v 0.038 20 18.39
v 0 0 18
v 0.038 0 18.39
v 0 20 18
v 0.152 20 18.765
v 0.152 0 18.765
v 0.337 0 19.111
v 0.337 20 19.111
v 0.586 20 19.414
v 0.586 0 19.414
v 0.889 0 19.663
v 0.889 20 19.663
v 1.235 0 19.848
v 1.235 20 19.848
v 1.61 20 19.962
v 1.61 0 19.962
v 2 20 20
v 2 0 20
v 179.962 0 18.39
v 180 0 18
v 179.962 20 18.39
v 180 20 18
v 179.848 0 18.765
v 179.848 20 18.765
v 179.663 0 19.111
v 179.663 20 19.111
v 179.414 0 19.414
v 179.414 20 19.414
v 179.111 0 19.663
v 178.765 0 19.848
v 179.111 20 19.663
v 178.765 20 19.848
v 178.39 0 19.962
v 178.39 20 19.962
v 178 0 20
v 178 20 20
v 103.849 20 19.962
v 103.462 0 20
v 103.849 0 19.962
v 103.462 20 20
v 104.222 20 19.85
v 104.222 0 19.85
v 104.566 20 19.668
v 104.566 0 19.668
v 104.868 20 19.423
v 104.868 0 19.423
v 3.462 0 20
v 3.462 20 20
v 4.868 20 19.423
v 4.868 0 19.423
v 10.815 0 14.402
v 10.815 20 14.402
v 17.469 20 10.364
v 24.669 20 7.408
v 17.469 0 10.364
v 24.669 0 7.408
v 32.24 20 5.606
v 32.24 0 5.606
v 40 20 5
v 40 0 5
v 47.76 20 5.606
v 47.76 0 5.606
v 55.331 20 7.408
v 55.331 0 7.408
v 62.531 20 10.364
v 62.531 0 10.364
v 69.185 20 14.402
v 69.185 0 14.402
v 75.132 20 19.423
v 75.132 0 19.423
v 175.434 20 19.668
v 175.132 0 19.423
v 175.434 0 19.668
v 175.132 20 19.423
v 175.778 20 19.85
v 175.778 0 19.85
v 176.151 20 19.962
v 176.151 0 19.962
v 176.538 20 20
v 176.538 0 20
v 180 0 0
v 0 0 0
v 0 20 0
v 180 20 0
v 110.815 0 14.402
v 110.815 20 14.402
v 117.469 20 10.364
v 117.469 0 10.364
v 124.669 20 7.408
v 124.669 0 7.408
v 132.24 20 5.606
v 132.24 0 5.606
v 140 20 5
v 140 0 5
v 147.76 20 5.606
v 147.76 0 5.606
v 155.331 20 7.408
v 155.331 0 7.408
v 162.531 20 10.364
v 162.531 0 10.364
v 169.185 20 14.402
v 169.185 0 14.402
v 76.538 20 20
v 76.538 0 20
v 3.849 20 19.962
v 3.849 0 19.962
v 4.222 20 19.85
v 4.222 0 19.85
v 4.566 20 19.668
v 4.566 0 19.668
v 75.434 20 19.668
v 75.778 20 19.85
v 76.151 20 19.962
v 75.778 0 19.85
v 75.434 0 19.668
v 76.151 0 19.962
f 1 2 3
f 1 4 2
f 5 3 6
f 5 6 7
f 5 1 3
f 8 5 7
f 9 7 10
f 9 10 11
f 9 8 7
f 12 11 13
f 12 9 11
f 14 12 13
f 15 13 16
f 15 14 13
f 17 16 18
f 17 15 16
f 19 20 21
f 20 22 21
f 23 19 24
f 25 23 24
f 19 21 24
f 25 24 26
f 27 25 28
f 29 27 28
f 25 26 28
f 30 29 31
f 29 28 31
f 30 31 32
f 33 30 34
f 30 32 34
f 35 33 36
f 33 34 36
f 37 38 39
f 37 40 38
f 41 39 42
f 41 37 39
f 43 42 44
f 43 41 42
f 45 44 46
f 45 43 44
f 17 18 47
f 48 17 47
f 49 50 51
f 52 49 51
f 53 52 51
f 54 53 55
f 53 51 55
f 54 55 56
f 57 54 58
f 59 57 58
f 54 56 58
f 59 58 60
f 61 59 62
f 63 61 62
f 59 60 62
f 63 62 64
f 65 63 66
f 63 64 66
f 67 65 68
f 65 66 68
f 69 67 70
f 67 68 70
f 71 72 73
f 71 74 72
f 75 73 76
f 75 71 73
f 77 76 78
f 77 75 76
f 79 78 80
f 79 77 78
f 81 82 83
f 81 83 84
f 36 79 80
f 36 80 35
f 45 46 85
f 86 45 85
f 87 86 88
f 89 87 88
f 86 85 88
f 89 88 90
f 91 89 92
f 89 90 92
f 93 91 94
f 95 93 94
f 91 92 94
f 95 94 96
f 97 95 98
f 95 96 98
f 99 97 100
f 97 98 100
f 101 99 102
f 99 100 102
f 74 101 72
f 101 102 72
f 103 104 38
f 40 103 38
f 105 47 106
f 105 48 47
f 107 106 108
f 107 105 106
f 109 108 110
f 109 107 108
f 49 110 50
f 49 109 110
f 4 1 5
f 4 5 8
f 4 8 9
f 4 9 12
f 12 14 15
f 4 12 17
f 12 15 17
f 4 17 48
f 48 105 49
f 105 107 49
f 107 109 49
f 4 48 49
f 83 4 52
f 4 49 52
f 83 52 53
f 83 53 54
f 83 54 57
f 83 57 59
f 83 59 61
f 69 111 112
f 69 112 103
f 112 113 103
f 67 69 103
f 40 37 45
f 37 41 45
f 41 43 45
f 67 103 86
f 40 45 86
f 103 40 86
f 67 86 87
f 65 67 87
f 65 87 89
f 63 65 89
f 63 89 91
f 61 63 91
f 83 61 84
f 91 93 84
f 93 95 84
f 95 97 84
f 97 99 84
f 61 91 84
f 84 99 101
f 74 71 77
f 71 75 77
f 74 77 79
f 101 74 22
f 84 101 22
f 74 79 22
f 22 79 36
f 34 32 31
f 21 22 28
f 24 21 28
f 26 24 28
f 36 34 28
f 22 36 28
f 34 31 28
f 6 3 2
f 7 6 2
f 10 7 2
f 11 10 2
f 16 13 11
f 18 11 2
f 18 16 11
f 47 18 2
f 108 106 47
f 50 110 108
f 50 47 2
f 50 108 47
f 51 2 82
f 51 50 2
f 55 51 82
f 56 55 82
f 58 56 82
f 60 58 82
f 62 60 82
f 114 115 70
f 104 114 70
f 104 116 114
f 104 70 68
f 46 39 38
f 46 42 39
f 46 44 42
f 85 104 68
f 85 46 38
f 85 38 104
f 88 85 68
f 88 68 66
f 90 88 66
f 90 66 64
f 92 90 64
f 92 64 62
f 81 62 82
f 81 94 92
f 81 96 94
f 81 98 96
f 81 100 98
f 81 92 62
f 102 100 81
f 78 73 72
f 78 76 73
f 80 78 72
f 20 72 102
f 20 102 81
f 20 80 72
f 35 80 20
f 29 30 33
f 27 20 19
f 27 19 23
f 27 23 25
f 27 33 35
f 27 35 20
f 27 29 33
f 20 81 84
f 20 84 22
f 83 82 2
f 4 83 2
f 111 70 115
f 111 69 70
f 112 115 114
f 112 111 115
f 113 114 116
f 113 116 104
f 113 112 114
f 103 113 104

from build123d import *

# Parameters (mm, degrees)
F0_W     = 180
F0_H     = 20
F1_DEPTH = 20
F3_DEPTH = 25
F4_R     = 2


with BuildPart() as f1:
    # F0 (on Front) → F1 (new body)
    with BuildSketch(Plane.XZ):
        with Locations((90, 10)):
            Rectangle(F0_W, F0_H)
    extrude(amount=-F1_DEPTH)

    # F2 (on face) → F3 (cut)
    with BuildSketch(Plane.XZ):
        with BuildLine():
            Line((75.7071421427, 20), (4.2928578573, 20))
            ThreePointArc((4.2928578573, 20), (40, 5), (75.7071421427, 20))
        make_face()
        with BuildLine():
            Line((175.7071421427, 20), (104.2928578573, 20))
            ThreePointArc((104.2928578573, 20), (140, 5), (175.7071421427, 20))
        make_face()
    extrude(amount=-F3_DEPTH, mode=Mode.SUBTRACT)

    # F4
    f4_edges = [f1.edges().sort_by_distance(p)[0] for p in [
        (0, 10, 20),
        (4.292858, 10, 20),
        (75.707142, 10, 20),
        (104.292858, 10, 20),
        (175.707142, 10, 20),
        (180, 10, 20),
    ]]
    fillet(f4_edges, radius=F4_R)


solid = f1.part
